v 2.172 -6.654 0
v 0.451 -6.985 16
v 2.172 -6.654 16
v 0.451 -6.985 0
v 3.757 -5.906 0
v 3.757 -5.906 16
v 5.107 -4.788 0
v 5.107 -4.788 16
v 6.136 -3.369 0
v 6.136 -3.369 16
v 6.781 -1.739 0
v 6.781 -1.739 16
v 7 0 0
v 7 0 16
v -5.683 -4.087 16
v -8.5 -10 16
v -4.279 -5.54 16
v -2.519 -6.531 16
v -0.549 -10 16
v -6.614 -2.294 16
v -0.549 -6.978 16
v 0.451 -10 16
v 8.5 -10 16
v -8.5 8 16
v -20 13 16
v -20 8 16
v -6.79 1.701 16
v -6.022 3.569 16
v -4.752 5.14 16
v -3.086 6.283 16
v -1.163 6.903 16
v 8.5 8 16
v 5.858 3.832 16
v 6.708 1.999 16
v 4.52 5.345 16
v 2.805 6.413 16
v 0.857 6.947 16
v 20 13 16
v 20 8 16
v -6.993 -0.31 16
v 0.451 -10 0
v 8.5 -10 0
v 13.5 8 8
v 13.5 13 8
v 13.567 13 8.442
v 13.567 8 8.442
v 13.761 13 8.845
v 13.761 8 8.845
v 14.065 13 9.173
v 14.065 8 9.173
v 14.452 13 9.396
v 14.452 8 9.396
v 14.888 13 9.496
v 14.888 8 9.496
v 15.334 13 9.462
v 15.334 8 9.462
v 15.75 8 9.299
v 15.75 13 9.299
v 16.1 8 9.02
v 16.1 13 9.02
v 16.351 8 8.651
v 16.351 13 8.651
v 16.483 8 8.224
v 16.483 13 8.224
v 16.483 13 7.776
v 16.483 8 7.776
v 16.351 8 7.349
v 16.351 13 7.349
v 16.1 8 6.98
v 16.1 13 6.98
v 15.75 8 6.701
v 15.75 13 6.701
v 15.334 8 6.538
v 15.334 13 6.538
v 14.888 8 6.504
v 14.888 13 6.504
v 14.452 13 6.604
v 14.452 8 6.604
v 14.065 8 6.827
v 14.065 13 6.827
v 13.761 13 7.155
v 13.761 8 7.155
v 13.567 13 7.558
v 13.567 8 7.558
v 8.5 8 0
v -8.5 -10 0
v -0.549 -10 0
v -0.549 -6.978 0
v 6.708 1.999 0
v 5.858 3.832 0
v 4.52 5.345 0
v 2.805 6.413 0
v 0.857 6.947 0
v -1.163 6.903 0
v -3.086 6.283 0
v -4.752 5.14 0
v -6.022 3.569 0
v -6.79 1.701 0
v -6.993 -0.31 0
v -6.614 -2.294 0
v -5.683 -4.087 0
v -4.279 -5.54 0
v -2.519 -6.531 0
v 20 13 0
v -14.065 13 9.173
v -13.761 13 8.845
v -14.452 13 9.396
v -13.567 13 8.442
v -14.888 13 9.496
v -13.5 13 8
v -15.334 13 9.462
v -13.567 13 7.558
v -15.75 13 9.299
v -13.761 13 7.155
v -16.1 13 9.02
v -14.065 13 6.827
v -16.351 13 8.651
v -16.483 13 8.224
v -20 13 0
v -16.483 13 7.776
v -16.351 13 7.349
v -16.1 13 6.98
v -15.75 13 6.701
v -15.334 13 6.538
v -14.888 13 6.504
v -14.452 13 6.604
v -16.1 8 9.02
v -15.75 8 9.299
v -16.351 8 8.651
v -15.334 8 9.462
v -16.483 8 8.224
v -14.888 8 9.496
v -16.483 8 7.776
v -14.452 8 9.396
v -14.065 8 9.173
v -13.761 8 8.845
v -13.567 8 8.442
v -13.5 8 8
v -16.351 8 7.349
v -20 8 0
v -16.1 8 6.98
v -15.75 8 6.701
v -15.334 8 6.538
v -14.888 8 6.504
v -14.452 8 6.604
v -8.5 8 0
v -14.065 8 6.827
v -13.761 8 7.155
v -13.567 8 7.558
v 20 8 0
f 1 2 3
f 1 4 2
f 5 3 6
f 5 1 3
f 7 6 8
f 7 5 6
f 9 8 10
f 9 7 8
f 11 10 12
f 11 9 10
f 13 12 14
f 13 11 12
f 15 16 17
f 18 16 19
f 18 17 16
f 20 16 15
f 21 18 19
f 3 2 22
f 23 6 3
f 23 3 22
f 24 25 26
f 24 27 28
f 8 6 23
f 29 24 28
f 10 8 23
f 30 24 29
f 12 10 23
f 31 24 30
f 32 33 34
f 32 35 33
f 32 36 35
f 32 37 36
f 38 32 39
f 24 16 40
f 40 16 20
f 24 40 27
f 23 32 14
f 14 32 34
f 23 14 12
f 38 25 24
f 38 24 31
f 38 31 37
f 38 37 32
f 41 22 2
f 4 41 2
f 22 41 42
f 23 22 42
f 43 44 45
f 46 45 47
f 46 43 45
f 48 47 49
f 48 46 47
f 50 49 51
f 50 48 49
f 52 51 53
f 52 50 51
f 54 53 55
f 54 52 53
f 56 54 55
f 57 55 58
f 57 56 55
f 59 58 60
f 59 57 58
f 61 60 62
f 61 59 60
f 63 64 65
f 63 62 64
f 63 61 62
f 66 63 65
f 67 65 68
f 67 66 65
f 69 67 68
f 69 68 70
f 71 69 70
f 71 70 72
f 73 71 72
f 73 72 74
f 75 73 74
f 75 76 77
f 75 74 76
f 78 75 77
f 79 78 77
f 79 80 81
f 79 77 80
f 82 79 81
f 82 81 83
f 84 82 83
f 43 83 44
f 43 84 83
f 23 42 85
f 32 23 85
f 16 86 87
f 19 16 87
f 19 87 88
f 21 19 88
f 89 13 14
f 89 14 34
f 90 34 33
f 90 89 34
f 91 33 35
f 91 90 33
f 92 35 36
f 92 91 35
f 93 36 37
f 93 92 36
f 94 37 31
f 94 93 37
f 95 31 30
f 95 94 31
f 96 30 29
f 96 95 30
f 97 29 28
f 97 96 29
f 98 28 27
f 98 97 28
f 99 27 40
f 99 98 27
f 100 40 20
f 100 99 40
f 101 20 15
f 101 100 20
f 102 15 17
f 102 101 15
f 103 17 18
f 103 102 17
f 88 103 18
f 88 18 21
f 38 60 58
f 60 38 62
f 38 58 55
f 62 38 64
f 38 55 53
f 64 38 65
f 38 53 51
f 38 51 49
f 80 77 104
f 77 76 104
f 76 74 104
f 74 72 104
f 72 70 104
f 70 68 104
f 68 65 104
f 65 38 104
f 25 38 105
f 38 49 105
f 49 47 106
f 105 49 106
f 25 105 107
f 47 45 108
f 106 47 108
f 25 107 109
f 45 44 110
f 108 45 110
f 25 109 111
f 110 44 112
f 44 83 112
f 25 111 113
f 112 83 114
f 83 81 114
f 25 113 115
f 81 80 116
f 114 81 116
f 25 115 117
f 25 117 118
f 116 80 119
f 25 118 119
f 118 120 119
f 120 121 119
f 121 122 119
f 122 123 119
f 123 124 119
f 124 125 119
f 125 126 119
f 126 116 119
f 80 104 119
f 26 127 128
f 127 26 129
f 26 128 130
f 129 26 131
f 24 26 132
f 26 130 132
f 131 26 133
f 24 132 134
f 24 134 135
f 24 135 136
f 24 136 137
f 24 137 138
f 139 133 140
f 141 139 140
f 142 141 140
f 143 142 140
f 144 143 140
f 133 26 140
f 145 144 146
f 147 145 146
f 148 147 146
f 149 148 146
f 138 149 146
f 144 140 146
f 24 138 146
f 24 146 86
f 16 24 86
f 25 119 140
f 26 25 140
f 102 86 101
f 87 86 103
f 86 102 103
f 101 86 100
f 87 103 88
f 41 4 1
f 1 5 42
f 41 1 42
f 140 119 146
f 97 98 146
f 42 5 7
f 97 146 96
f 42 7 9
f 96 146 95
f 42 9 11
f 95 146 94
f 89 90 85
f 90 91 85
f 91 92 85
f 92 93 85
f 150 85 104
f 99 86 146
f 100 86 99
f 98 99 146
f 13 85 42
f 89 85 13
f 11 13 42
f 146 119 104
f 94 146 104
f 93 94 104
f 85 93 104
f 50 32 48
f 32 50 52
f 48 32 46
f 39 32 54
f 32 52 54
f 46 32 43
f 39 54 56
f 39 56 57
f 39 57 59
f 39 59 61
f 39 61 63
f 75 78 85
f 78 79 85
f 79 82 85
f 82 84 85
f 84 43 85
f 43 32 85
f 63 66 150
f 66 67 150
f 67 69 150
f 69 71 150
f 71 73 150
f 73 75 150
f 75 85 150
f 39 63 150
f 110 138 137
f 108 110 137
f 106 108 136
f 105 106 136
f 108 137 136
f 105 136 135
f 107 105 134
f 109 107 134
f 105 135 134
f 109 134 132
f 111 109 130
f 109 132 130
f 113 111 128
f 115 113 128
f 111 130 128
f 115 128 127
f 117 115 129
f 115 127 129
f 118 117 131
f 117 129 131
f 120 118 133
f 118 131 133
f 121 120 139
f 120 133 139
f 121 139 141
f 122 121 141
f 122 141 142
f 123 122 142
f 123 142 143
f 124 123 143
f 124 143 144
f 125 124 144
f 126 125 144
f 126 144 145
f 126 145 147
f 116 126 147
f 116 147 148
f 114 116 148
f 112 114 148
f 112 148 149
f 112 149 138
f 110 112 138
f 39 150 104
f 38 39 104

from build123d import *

# Parameters (mm, degrees)
ESBO_O1_R                = 7
RESSALTO_EXTRUS_O1_DEPTH = 16
ESBO_O2_W                = 1
ESBO_O2_H                = 5.647679103
CORTE_EXTRUS_O1_DEPTH    = 17
ESBO_O3_R                = 1.5
CORTE_EXTRUS_O2_DEPTH    = 16


with BuildPart() as part:
    # Esboço1 → Ressalto-extrusão1 (new body)
    with BuildSketch(Plane.XY):
        Polygon((-20, 8), (-8.5, 8), (-8.5, -10), (8.5, -10), (8.5, 8), (20, 8), (20, 13), (-20, 13), align=None)
        Circle(ESBO_O1_R, mode=Mode.SUBTRACT)
    extrude(amount=RESSALTO_EXTRUS_O1_DEPTH)

    # Esboço2 → Corte-extrusão1 (cut, through all)
    with BuildSketch(Plane.XY.offset(16)):
        with Locations((-0.048670763, -9.044181363)):
            Rectangle(ESBO_O2_W, ESBO_O2_H)
    extrude(amount=-CORTE_EXTRUS_O1_DEPTH, mode=Mode.SUBTRACT)

    # Esboço3 → Corte-extrusão2 (cut)
    with BuildSketch(Plane.XZ.offset(-8)):
        with Locations((-15, 8)):
            Circle(ESBO_O3_R)
    corte_extrus_o2 = extrude(amount=-CORTE_EXTRUS_O2_DEPTH, mode=Mode.SUBTRACT)

    # Espelhar1: Corte-extrusão2 across plane
    add(corte_extrus_o2.mirror(Plane(origin=(0, 0, 0), x_dir=(0, 0, 1), z_dir=(1, 0, 0))), mode=Mode.SUBTRACT)


solid = part.part
